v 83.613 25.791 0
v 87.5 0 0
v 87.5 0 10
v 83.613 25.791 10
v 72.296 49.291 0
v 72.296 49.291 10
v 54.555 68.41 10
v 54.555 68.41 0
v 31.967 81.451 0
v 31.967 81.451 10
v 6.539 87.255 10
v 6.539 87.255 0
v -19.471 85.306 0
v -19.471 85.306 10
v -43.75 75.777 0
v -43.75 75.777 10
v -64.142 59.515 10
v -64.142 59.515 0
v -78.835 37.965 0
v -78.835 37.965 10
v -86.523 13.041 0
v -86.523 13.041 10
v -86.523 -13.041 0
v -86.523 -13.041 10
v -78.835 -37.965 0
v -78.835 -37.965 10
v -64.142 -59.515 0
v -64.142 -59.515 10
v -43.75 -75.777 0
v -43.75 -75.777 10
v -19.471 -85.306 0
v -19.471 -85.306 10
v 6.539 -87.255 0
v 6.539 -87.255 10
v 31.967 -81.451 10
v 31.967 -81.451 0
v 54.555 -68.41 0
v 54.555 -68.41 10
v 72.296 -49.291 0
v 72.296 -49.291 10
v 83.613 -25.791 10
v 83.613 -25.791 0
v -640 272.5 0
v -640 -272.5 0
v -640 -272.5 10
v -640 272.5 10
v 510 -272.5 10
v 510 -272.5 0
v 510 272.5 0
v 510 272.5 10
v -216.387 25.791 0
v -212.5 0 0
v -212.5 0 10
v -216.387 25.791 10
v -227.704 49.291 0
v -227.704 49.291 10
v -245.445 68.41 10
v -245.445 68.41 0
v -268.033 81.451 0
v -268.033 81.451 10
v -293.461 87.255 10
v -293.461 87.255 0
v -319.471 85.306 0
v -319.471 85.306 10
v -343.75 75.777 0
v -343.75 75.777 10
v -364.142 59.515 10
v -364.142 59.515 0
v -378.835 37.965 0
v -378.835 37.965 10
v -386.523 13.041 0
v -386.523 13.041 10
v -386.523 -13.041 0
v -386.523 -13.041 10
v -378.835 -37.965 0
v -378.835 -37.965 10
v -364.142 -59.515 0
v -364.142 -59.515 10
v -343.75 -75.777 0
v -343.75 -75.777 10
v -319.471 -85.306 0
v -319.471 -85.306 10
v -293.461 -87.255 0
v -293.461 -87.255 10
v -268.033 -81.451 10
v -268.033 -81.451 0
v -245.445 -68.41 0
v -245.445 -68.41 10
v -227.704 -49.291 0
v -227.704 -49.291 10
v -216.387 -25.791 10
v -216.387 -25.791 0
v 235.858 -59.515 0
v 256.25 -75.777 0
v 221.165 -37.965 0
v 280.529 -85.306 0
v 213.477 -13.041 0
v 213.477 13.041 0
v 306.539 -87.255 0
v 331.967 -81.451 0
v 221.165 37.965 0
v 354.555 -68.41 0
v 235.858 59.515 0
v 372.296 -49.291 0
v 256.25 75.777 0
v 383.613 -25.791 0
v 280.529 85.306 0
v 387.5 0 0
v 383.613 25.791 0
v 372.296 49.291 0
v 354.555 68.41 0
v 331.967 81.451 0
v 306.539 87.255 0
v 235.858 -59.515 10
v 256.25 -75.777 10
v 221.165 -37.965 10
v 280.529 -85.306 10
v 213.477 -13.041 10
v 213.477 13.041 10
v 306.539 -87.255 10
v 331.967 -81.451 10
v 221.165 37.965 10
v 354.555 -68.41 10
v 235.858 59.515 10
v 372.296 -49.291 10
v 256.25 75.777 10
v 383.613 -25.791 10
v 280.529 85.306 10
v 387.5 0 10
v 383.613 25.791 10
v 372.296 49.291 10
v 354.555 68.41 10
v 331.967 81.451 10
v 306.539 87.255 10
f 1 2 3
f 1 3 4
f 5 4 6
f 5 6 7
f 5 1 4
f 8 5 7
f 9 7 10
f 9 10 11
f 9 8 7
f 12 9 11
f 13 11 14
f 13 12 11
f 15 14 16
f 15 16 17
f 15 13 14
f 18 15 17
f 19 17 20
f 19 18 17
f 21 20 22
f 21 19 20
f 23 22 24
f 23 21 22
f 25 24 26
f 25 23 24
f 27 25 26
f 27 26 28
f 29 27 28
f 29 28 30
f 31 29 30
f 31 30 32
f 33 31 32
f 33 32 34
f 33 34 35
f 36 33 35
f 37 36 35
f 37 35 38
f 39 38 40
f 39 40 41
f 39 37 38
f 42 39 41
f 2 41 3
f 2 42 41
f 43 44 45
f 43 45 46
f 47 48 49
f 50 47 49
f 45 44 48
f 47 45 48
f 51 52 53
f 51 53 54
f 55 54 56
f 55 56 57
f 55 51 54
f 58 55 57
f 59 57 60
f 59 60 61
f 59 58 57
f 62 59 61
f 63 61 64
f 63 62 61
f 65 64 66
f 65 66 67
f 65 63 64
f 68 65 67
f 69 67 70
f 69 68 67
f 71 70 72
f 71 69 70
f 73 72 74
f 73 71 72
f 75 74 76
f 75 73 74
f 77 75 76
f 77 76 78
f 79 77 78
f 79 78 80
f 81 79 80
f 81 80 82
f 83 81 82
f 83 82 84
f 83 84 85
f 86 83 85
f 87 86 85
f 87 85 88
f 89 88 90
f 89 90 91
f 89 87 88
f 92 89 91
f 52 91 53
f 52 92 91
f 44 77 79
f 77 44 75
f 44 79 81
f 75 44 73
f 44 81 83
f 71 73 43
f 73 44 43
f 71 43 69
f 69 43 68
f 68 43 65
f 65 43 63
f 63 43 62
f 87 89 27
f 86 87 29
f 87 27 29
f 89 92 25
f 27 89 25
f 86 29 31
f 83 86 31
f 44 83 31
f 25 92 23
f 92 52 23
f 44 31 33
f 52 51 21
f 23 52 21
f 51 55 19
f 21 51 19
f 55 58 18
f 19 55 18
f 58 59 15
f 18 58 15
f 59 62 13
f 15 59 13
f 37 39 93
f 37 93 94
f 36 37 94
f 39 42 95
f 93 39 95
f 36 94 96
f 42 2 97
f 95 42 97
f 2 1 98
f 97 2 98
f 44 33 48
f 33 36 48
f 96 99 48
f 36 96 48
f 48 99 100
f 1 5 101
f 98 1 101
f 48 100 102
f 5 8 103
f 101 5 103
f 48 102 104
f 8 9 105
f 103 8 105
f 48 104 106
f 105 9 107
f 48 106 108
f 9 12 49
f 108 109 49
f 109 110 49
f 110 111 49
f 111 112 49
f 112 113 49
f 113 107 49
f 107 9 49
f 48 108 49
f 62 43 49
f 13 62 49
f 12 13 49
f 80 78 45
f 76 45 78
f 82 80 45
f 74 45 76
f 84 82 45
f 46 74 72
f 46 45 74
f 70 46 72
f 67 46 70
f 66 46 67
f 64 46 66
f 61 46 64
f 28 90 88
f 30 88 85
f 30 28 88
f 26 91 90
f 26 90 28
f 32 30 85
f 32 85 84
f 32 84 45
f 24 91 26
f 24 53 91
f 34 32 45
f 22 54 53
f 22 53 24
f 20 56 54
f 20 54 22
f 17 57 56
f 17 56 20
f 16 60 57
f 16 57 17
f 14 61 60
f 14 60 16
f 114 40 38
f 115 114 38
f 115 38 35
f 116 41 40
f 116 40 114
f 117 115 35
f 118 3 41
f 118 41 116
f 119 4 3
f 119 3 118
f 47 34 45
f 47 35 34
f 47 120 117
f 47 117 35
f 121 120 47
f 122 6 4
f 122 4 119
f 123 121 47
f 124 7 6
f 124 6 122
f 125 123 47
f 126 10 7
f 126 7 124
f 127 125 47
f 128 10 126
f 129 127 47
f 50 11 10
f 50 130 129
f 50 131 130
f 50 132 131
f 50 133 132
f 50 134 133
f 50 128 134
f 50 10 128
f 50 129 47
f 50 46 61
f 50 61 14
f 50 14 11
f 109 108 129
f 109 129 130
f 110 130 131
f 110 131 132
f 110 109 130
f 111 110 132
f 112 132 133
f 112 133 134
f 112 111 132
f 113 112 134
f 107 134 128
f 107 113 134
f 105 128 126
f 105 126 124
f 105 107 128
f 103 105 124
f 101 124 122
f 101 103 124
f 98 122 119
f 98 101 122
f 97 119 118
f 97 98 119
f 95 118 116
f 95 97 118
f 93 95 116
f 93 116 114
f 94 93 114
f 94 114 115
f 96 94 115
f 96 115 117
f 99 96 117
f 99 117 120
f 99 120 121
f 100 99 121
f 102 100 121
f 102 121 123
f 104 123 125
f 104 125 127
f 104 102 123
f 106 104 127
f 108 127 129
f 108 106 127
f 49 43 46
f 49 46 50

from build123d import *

# Parameters (mm, degrees)
SKETCH1_W           = 1150
SKETCH1_H           = 545
SKETCH1_R           = 87.5
BOSS_EXTRUDE1_DEPTH = 10


with BuildPart() as part:
    # Sketch1 → Boss-Extrude1 (new body)
    with BuildSketch(Plane.XY):
        with Locations((-65, 0)):
            Rectangle(SKETCH1_W, SKETCH1_H)
        with Locations((-300, 0)):
            Circle(SKETCH1_R, mode=Mode.SUBTRACT)
        Circle(SKETCH1_R, mode=Mode.SUBTRACT)
        with Locations((300, 0)):
            Circle(SKETCH1_R, mode=Mode.SUBTRACT)
    extrude(amount=BOSS_EXTRUDE1_DEPTH)


solid = part.part
